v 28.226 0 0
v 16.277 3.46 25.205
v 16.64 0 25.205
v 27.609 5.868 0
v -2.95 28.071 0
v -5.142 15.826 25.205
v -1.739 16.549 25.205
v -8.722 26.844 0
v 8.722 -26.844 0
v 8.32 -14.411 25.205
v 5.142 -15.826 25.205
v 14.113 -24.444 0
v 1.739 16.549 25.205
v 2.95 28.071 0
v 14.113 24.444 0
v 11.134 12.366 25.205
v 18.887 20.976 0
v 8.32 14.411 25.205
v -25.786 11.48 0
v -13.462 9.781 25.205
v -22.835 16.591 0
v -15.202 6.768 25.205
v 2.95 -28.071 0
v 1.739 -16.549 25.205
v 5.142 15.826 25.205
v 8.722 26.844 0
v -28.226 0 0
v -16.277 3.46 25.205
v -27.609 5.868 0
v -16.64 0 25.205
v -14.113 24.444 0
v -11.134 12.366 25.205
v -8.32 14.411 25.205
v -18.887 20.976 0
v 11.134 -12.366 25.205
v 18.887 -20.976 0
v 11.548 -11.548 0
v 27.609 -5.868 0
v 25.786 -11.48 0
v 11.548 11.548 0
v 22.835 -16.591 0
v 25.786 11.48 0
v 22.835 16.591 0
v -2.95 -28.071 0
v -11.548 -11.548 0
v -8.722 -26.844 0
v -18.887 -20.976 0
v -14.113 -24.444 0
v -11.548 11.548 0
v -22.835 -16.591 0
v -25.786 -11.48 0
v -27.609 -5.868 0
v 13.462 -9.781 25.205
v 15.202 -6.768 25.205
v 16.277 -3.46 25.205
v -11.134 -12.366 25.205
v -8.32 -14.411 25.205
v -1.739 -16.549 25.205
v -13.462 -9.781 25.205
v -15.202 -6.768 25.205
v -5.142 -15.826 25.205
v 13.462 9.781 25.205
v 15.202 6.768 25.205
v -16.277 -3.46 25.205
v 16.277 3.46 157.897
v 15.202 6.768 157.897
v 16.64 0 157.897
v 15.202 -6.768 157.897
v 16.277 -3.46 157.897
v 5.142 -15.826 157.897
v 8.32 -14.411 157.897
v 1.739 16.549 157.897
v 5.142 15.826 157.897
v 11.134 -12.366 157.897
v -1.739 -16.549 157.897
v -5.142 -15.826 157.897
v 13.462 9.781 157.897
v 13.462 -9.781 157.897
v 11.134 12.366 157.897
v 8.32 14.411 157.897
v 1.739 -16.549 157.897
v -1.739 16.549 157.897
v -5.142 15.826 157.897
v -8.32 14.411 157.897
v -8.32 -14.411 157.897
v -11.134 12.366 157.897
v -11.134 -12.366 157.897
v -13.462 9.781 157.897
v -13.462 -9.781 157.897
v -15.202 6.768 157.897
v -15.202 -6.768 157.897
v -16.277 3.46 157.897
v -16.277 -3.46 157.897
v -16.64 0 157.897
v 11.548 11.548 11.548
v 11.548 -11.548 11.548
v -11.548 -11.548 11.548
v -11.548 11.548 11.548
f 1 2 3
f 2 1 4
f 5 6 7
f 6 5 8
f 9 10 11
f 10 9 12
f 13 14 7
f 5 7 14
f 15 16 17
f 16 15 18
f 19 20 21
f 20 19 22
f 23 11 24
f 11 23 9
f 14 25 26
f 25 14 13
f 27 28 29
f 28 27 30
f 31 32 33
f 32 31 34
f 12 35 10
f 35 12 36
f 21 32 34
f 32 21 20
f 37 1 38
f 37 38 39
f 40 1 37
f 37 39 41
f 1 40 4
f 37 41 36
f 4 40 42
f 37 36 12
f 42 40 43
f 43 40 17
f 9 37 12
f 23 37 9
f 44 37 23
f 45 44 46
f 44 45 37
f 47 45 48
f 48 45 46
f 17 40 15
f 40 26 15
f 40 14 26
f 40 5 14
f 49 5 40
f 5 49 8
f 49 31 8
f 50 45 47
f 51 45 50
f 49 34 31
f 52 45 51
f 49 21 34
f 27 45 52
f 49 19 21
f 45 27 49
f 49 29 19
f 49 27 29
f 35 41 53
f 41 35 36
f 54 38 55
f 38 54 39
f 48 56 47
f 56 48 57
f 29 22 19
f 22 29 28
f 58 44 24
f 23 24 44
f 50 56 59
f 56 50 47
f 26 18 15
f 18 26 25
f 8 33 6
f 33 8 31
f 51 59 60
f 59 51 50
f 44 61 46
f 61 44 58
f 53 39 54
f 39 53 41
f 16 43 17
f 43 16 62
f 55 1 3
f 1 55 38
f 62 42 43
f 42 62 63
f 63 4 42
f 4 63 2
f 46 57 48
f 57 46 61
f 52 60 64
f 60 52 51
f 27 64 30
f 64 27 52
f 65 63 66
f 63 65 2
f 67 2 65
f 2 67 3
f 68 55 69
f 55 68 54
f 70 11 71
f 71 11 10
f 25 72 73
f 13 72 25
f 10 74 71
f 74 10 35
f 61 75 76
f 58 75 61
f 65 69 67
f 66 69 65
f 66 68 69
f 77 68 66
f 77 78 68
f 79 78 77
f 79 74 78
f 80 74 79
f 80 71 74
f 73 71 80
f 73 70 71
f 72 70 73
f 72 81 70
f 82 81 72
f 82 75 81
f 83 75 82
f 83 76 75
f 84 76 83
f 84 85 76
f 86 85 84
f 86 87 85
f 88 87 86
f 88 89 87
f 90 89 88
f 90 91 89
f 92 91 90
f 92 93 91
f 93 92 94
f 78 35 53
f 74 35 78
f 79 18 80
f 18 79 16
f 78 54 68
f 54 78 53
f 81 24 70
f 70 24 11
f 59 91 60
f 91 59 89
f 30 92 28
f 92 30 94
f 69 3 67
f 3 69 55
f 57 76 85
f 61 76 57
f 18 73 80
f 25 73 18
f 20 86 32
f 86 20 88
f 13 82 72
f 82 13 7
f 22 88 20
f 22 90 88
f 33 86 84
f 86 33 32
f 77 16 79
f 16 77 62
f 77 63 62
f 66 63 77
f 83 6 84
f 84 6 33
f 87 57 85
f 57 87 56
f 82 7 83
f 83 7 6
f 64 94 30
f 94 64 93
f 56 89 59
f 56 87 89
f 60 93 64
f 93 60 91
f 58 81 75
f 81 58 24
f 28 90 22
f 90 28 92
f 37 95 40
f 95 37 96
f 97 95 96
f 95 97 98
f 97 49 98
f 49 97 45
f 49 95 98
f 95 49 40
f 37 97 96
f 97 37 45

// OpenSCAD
seed = 1;
seeds = rands(0,1000000,10,seed);
head_outer_radius = rands(25,50,1,seeds[0])[0];
head_inner_radius = rands(10,head_outer_radius*2/3,1,seeds[1])[0];
head_length = rands(40,80,1,seeds[2])[0];
bolt_length = rands(head_length*2,200,1,seeds[3])[0];
cube_size = rands(head_inner_radius, head_length/2,1, seeds[4])[0];

difference(){
    union(){
        cylinder(head_length,head_outer_radius,0);
        cylinder(bolt_length,head_inner_radius,head_inner_radius);
    }
    cube(cube_size, true);
}
